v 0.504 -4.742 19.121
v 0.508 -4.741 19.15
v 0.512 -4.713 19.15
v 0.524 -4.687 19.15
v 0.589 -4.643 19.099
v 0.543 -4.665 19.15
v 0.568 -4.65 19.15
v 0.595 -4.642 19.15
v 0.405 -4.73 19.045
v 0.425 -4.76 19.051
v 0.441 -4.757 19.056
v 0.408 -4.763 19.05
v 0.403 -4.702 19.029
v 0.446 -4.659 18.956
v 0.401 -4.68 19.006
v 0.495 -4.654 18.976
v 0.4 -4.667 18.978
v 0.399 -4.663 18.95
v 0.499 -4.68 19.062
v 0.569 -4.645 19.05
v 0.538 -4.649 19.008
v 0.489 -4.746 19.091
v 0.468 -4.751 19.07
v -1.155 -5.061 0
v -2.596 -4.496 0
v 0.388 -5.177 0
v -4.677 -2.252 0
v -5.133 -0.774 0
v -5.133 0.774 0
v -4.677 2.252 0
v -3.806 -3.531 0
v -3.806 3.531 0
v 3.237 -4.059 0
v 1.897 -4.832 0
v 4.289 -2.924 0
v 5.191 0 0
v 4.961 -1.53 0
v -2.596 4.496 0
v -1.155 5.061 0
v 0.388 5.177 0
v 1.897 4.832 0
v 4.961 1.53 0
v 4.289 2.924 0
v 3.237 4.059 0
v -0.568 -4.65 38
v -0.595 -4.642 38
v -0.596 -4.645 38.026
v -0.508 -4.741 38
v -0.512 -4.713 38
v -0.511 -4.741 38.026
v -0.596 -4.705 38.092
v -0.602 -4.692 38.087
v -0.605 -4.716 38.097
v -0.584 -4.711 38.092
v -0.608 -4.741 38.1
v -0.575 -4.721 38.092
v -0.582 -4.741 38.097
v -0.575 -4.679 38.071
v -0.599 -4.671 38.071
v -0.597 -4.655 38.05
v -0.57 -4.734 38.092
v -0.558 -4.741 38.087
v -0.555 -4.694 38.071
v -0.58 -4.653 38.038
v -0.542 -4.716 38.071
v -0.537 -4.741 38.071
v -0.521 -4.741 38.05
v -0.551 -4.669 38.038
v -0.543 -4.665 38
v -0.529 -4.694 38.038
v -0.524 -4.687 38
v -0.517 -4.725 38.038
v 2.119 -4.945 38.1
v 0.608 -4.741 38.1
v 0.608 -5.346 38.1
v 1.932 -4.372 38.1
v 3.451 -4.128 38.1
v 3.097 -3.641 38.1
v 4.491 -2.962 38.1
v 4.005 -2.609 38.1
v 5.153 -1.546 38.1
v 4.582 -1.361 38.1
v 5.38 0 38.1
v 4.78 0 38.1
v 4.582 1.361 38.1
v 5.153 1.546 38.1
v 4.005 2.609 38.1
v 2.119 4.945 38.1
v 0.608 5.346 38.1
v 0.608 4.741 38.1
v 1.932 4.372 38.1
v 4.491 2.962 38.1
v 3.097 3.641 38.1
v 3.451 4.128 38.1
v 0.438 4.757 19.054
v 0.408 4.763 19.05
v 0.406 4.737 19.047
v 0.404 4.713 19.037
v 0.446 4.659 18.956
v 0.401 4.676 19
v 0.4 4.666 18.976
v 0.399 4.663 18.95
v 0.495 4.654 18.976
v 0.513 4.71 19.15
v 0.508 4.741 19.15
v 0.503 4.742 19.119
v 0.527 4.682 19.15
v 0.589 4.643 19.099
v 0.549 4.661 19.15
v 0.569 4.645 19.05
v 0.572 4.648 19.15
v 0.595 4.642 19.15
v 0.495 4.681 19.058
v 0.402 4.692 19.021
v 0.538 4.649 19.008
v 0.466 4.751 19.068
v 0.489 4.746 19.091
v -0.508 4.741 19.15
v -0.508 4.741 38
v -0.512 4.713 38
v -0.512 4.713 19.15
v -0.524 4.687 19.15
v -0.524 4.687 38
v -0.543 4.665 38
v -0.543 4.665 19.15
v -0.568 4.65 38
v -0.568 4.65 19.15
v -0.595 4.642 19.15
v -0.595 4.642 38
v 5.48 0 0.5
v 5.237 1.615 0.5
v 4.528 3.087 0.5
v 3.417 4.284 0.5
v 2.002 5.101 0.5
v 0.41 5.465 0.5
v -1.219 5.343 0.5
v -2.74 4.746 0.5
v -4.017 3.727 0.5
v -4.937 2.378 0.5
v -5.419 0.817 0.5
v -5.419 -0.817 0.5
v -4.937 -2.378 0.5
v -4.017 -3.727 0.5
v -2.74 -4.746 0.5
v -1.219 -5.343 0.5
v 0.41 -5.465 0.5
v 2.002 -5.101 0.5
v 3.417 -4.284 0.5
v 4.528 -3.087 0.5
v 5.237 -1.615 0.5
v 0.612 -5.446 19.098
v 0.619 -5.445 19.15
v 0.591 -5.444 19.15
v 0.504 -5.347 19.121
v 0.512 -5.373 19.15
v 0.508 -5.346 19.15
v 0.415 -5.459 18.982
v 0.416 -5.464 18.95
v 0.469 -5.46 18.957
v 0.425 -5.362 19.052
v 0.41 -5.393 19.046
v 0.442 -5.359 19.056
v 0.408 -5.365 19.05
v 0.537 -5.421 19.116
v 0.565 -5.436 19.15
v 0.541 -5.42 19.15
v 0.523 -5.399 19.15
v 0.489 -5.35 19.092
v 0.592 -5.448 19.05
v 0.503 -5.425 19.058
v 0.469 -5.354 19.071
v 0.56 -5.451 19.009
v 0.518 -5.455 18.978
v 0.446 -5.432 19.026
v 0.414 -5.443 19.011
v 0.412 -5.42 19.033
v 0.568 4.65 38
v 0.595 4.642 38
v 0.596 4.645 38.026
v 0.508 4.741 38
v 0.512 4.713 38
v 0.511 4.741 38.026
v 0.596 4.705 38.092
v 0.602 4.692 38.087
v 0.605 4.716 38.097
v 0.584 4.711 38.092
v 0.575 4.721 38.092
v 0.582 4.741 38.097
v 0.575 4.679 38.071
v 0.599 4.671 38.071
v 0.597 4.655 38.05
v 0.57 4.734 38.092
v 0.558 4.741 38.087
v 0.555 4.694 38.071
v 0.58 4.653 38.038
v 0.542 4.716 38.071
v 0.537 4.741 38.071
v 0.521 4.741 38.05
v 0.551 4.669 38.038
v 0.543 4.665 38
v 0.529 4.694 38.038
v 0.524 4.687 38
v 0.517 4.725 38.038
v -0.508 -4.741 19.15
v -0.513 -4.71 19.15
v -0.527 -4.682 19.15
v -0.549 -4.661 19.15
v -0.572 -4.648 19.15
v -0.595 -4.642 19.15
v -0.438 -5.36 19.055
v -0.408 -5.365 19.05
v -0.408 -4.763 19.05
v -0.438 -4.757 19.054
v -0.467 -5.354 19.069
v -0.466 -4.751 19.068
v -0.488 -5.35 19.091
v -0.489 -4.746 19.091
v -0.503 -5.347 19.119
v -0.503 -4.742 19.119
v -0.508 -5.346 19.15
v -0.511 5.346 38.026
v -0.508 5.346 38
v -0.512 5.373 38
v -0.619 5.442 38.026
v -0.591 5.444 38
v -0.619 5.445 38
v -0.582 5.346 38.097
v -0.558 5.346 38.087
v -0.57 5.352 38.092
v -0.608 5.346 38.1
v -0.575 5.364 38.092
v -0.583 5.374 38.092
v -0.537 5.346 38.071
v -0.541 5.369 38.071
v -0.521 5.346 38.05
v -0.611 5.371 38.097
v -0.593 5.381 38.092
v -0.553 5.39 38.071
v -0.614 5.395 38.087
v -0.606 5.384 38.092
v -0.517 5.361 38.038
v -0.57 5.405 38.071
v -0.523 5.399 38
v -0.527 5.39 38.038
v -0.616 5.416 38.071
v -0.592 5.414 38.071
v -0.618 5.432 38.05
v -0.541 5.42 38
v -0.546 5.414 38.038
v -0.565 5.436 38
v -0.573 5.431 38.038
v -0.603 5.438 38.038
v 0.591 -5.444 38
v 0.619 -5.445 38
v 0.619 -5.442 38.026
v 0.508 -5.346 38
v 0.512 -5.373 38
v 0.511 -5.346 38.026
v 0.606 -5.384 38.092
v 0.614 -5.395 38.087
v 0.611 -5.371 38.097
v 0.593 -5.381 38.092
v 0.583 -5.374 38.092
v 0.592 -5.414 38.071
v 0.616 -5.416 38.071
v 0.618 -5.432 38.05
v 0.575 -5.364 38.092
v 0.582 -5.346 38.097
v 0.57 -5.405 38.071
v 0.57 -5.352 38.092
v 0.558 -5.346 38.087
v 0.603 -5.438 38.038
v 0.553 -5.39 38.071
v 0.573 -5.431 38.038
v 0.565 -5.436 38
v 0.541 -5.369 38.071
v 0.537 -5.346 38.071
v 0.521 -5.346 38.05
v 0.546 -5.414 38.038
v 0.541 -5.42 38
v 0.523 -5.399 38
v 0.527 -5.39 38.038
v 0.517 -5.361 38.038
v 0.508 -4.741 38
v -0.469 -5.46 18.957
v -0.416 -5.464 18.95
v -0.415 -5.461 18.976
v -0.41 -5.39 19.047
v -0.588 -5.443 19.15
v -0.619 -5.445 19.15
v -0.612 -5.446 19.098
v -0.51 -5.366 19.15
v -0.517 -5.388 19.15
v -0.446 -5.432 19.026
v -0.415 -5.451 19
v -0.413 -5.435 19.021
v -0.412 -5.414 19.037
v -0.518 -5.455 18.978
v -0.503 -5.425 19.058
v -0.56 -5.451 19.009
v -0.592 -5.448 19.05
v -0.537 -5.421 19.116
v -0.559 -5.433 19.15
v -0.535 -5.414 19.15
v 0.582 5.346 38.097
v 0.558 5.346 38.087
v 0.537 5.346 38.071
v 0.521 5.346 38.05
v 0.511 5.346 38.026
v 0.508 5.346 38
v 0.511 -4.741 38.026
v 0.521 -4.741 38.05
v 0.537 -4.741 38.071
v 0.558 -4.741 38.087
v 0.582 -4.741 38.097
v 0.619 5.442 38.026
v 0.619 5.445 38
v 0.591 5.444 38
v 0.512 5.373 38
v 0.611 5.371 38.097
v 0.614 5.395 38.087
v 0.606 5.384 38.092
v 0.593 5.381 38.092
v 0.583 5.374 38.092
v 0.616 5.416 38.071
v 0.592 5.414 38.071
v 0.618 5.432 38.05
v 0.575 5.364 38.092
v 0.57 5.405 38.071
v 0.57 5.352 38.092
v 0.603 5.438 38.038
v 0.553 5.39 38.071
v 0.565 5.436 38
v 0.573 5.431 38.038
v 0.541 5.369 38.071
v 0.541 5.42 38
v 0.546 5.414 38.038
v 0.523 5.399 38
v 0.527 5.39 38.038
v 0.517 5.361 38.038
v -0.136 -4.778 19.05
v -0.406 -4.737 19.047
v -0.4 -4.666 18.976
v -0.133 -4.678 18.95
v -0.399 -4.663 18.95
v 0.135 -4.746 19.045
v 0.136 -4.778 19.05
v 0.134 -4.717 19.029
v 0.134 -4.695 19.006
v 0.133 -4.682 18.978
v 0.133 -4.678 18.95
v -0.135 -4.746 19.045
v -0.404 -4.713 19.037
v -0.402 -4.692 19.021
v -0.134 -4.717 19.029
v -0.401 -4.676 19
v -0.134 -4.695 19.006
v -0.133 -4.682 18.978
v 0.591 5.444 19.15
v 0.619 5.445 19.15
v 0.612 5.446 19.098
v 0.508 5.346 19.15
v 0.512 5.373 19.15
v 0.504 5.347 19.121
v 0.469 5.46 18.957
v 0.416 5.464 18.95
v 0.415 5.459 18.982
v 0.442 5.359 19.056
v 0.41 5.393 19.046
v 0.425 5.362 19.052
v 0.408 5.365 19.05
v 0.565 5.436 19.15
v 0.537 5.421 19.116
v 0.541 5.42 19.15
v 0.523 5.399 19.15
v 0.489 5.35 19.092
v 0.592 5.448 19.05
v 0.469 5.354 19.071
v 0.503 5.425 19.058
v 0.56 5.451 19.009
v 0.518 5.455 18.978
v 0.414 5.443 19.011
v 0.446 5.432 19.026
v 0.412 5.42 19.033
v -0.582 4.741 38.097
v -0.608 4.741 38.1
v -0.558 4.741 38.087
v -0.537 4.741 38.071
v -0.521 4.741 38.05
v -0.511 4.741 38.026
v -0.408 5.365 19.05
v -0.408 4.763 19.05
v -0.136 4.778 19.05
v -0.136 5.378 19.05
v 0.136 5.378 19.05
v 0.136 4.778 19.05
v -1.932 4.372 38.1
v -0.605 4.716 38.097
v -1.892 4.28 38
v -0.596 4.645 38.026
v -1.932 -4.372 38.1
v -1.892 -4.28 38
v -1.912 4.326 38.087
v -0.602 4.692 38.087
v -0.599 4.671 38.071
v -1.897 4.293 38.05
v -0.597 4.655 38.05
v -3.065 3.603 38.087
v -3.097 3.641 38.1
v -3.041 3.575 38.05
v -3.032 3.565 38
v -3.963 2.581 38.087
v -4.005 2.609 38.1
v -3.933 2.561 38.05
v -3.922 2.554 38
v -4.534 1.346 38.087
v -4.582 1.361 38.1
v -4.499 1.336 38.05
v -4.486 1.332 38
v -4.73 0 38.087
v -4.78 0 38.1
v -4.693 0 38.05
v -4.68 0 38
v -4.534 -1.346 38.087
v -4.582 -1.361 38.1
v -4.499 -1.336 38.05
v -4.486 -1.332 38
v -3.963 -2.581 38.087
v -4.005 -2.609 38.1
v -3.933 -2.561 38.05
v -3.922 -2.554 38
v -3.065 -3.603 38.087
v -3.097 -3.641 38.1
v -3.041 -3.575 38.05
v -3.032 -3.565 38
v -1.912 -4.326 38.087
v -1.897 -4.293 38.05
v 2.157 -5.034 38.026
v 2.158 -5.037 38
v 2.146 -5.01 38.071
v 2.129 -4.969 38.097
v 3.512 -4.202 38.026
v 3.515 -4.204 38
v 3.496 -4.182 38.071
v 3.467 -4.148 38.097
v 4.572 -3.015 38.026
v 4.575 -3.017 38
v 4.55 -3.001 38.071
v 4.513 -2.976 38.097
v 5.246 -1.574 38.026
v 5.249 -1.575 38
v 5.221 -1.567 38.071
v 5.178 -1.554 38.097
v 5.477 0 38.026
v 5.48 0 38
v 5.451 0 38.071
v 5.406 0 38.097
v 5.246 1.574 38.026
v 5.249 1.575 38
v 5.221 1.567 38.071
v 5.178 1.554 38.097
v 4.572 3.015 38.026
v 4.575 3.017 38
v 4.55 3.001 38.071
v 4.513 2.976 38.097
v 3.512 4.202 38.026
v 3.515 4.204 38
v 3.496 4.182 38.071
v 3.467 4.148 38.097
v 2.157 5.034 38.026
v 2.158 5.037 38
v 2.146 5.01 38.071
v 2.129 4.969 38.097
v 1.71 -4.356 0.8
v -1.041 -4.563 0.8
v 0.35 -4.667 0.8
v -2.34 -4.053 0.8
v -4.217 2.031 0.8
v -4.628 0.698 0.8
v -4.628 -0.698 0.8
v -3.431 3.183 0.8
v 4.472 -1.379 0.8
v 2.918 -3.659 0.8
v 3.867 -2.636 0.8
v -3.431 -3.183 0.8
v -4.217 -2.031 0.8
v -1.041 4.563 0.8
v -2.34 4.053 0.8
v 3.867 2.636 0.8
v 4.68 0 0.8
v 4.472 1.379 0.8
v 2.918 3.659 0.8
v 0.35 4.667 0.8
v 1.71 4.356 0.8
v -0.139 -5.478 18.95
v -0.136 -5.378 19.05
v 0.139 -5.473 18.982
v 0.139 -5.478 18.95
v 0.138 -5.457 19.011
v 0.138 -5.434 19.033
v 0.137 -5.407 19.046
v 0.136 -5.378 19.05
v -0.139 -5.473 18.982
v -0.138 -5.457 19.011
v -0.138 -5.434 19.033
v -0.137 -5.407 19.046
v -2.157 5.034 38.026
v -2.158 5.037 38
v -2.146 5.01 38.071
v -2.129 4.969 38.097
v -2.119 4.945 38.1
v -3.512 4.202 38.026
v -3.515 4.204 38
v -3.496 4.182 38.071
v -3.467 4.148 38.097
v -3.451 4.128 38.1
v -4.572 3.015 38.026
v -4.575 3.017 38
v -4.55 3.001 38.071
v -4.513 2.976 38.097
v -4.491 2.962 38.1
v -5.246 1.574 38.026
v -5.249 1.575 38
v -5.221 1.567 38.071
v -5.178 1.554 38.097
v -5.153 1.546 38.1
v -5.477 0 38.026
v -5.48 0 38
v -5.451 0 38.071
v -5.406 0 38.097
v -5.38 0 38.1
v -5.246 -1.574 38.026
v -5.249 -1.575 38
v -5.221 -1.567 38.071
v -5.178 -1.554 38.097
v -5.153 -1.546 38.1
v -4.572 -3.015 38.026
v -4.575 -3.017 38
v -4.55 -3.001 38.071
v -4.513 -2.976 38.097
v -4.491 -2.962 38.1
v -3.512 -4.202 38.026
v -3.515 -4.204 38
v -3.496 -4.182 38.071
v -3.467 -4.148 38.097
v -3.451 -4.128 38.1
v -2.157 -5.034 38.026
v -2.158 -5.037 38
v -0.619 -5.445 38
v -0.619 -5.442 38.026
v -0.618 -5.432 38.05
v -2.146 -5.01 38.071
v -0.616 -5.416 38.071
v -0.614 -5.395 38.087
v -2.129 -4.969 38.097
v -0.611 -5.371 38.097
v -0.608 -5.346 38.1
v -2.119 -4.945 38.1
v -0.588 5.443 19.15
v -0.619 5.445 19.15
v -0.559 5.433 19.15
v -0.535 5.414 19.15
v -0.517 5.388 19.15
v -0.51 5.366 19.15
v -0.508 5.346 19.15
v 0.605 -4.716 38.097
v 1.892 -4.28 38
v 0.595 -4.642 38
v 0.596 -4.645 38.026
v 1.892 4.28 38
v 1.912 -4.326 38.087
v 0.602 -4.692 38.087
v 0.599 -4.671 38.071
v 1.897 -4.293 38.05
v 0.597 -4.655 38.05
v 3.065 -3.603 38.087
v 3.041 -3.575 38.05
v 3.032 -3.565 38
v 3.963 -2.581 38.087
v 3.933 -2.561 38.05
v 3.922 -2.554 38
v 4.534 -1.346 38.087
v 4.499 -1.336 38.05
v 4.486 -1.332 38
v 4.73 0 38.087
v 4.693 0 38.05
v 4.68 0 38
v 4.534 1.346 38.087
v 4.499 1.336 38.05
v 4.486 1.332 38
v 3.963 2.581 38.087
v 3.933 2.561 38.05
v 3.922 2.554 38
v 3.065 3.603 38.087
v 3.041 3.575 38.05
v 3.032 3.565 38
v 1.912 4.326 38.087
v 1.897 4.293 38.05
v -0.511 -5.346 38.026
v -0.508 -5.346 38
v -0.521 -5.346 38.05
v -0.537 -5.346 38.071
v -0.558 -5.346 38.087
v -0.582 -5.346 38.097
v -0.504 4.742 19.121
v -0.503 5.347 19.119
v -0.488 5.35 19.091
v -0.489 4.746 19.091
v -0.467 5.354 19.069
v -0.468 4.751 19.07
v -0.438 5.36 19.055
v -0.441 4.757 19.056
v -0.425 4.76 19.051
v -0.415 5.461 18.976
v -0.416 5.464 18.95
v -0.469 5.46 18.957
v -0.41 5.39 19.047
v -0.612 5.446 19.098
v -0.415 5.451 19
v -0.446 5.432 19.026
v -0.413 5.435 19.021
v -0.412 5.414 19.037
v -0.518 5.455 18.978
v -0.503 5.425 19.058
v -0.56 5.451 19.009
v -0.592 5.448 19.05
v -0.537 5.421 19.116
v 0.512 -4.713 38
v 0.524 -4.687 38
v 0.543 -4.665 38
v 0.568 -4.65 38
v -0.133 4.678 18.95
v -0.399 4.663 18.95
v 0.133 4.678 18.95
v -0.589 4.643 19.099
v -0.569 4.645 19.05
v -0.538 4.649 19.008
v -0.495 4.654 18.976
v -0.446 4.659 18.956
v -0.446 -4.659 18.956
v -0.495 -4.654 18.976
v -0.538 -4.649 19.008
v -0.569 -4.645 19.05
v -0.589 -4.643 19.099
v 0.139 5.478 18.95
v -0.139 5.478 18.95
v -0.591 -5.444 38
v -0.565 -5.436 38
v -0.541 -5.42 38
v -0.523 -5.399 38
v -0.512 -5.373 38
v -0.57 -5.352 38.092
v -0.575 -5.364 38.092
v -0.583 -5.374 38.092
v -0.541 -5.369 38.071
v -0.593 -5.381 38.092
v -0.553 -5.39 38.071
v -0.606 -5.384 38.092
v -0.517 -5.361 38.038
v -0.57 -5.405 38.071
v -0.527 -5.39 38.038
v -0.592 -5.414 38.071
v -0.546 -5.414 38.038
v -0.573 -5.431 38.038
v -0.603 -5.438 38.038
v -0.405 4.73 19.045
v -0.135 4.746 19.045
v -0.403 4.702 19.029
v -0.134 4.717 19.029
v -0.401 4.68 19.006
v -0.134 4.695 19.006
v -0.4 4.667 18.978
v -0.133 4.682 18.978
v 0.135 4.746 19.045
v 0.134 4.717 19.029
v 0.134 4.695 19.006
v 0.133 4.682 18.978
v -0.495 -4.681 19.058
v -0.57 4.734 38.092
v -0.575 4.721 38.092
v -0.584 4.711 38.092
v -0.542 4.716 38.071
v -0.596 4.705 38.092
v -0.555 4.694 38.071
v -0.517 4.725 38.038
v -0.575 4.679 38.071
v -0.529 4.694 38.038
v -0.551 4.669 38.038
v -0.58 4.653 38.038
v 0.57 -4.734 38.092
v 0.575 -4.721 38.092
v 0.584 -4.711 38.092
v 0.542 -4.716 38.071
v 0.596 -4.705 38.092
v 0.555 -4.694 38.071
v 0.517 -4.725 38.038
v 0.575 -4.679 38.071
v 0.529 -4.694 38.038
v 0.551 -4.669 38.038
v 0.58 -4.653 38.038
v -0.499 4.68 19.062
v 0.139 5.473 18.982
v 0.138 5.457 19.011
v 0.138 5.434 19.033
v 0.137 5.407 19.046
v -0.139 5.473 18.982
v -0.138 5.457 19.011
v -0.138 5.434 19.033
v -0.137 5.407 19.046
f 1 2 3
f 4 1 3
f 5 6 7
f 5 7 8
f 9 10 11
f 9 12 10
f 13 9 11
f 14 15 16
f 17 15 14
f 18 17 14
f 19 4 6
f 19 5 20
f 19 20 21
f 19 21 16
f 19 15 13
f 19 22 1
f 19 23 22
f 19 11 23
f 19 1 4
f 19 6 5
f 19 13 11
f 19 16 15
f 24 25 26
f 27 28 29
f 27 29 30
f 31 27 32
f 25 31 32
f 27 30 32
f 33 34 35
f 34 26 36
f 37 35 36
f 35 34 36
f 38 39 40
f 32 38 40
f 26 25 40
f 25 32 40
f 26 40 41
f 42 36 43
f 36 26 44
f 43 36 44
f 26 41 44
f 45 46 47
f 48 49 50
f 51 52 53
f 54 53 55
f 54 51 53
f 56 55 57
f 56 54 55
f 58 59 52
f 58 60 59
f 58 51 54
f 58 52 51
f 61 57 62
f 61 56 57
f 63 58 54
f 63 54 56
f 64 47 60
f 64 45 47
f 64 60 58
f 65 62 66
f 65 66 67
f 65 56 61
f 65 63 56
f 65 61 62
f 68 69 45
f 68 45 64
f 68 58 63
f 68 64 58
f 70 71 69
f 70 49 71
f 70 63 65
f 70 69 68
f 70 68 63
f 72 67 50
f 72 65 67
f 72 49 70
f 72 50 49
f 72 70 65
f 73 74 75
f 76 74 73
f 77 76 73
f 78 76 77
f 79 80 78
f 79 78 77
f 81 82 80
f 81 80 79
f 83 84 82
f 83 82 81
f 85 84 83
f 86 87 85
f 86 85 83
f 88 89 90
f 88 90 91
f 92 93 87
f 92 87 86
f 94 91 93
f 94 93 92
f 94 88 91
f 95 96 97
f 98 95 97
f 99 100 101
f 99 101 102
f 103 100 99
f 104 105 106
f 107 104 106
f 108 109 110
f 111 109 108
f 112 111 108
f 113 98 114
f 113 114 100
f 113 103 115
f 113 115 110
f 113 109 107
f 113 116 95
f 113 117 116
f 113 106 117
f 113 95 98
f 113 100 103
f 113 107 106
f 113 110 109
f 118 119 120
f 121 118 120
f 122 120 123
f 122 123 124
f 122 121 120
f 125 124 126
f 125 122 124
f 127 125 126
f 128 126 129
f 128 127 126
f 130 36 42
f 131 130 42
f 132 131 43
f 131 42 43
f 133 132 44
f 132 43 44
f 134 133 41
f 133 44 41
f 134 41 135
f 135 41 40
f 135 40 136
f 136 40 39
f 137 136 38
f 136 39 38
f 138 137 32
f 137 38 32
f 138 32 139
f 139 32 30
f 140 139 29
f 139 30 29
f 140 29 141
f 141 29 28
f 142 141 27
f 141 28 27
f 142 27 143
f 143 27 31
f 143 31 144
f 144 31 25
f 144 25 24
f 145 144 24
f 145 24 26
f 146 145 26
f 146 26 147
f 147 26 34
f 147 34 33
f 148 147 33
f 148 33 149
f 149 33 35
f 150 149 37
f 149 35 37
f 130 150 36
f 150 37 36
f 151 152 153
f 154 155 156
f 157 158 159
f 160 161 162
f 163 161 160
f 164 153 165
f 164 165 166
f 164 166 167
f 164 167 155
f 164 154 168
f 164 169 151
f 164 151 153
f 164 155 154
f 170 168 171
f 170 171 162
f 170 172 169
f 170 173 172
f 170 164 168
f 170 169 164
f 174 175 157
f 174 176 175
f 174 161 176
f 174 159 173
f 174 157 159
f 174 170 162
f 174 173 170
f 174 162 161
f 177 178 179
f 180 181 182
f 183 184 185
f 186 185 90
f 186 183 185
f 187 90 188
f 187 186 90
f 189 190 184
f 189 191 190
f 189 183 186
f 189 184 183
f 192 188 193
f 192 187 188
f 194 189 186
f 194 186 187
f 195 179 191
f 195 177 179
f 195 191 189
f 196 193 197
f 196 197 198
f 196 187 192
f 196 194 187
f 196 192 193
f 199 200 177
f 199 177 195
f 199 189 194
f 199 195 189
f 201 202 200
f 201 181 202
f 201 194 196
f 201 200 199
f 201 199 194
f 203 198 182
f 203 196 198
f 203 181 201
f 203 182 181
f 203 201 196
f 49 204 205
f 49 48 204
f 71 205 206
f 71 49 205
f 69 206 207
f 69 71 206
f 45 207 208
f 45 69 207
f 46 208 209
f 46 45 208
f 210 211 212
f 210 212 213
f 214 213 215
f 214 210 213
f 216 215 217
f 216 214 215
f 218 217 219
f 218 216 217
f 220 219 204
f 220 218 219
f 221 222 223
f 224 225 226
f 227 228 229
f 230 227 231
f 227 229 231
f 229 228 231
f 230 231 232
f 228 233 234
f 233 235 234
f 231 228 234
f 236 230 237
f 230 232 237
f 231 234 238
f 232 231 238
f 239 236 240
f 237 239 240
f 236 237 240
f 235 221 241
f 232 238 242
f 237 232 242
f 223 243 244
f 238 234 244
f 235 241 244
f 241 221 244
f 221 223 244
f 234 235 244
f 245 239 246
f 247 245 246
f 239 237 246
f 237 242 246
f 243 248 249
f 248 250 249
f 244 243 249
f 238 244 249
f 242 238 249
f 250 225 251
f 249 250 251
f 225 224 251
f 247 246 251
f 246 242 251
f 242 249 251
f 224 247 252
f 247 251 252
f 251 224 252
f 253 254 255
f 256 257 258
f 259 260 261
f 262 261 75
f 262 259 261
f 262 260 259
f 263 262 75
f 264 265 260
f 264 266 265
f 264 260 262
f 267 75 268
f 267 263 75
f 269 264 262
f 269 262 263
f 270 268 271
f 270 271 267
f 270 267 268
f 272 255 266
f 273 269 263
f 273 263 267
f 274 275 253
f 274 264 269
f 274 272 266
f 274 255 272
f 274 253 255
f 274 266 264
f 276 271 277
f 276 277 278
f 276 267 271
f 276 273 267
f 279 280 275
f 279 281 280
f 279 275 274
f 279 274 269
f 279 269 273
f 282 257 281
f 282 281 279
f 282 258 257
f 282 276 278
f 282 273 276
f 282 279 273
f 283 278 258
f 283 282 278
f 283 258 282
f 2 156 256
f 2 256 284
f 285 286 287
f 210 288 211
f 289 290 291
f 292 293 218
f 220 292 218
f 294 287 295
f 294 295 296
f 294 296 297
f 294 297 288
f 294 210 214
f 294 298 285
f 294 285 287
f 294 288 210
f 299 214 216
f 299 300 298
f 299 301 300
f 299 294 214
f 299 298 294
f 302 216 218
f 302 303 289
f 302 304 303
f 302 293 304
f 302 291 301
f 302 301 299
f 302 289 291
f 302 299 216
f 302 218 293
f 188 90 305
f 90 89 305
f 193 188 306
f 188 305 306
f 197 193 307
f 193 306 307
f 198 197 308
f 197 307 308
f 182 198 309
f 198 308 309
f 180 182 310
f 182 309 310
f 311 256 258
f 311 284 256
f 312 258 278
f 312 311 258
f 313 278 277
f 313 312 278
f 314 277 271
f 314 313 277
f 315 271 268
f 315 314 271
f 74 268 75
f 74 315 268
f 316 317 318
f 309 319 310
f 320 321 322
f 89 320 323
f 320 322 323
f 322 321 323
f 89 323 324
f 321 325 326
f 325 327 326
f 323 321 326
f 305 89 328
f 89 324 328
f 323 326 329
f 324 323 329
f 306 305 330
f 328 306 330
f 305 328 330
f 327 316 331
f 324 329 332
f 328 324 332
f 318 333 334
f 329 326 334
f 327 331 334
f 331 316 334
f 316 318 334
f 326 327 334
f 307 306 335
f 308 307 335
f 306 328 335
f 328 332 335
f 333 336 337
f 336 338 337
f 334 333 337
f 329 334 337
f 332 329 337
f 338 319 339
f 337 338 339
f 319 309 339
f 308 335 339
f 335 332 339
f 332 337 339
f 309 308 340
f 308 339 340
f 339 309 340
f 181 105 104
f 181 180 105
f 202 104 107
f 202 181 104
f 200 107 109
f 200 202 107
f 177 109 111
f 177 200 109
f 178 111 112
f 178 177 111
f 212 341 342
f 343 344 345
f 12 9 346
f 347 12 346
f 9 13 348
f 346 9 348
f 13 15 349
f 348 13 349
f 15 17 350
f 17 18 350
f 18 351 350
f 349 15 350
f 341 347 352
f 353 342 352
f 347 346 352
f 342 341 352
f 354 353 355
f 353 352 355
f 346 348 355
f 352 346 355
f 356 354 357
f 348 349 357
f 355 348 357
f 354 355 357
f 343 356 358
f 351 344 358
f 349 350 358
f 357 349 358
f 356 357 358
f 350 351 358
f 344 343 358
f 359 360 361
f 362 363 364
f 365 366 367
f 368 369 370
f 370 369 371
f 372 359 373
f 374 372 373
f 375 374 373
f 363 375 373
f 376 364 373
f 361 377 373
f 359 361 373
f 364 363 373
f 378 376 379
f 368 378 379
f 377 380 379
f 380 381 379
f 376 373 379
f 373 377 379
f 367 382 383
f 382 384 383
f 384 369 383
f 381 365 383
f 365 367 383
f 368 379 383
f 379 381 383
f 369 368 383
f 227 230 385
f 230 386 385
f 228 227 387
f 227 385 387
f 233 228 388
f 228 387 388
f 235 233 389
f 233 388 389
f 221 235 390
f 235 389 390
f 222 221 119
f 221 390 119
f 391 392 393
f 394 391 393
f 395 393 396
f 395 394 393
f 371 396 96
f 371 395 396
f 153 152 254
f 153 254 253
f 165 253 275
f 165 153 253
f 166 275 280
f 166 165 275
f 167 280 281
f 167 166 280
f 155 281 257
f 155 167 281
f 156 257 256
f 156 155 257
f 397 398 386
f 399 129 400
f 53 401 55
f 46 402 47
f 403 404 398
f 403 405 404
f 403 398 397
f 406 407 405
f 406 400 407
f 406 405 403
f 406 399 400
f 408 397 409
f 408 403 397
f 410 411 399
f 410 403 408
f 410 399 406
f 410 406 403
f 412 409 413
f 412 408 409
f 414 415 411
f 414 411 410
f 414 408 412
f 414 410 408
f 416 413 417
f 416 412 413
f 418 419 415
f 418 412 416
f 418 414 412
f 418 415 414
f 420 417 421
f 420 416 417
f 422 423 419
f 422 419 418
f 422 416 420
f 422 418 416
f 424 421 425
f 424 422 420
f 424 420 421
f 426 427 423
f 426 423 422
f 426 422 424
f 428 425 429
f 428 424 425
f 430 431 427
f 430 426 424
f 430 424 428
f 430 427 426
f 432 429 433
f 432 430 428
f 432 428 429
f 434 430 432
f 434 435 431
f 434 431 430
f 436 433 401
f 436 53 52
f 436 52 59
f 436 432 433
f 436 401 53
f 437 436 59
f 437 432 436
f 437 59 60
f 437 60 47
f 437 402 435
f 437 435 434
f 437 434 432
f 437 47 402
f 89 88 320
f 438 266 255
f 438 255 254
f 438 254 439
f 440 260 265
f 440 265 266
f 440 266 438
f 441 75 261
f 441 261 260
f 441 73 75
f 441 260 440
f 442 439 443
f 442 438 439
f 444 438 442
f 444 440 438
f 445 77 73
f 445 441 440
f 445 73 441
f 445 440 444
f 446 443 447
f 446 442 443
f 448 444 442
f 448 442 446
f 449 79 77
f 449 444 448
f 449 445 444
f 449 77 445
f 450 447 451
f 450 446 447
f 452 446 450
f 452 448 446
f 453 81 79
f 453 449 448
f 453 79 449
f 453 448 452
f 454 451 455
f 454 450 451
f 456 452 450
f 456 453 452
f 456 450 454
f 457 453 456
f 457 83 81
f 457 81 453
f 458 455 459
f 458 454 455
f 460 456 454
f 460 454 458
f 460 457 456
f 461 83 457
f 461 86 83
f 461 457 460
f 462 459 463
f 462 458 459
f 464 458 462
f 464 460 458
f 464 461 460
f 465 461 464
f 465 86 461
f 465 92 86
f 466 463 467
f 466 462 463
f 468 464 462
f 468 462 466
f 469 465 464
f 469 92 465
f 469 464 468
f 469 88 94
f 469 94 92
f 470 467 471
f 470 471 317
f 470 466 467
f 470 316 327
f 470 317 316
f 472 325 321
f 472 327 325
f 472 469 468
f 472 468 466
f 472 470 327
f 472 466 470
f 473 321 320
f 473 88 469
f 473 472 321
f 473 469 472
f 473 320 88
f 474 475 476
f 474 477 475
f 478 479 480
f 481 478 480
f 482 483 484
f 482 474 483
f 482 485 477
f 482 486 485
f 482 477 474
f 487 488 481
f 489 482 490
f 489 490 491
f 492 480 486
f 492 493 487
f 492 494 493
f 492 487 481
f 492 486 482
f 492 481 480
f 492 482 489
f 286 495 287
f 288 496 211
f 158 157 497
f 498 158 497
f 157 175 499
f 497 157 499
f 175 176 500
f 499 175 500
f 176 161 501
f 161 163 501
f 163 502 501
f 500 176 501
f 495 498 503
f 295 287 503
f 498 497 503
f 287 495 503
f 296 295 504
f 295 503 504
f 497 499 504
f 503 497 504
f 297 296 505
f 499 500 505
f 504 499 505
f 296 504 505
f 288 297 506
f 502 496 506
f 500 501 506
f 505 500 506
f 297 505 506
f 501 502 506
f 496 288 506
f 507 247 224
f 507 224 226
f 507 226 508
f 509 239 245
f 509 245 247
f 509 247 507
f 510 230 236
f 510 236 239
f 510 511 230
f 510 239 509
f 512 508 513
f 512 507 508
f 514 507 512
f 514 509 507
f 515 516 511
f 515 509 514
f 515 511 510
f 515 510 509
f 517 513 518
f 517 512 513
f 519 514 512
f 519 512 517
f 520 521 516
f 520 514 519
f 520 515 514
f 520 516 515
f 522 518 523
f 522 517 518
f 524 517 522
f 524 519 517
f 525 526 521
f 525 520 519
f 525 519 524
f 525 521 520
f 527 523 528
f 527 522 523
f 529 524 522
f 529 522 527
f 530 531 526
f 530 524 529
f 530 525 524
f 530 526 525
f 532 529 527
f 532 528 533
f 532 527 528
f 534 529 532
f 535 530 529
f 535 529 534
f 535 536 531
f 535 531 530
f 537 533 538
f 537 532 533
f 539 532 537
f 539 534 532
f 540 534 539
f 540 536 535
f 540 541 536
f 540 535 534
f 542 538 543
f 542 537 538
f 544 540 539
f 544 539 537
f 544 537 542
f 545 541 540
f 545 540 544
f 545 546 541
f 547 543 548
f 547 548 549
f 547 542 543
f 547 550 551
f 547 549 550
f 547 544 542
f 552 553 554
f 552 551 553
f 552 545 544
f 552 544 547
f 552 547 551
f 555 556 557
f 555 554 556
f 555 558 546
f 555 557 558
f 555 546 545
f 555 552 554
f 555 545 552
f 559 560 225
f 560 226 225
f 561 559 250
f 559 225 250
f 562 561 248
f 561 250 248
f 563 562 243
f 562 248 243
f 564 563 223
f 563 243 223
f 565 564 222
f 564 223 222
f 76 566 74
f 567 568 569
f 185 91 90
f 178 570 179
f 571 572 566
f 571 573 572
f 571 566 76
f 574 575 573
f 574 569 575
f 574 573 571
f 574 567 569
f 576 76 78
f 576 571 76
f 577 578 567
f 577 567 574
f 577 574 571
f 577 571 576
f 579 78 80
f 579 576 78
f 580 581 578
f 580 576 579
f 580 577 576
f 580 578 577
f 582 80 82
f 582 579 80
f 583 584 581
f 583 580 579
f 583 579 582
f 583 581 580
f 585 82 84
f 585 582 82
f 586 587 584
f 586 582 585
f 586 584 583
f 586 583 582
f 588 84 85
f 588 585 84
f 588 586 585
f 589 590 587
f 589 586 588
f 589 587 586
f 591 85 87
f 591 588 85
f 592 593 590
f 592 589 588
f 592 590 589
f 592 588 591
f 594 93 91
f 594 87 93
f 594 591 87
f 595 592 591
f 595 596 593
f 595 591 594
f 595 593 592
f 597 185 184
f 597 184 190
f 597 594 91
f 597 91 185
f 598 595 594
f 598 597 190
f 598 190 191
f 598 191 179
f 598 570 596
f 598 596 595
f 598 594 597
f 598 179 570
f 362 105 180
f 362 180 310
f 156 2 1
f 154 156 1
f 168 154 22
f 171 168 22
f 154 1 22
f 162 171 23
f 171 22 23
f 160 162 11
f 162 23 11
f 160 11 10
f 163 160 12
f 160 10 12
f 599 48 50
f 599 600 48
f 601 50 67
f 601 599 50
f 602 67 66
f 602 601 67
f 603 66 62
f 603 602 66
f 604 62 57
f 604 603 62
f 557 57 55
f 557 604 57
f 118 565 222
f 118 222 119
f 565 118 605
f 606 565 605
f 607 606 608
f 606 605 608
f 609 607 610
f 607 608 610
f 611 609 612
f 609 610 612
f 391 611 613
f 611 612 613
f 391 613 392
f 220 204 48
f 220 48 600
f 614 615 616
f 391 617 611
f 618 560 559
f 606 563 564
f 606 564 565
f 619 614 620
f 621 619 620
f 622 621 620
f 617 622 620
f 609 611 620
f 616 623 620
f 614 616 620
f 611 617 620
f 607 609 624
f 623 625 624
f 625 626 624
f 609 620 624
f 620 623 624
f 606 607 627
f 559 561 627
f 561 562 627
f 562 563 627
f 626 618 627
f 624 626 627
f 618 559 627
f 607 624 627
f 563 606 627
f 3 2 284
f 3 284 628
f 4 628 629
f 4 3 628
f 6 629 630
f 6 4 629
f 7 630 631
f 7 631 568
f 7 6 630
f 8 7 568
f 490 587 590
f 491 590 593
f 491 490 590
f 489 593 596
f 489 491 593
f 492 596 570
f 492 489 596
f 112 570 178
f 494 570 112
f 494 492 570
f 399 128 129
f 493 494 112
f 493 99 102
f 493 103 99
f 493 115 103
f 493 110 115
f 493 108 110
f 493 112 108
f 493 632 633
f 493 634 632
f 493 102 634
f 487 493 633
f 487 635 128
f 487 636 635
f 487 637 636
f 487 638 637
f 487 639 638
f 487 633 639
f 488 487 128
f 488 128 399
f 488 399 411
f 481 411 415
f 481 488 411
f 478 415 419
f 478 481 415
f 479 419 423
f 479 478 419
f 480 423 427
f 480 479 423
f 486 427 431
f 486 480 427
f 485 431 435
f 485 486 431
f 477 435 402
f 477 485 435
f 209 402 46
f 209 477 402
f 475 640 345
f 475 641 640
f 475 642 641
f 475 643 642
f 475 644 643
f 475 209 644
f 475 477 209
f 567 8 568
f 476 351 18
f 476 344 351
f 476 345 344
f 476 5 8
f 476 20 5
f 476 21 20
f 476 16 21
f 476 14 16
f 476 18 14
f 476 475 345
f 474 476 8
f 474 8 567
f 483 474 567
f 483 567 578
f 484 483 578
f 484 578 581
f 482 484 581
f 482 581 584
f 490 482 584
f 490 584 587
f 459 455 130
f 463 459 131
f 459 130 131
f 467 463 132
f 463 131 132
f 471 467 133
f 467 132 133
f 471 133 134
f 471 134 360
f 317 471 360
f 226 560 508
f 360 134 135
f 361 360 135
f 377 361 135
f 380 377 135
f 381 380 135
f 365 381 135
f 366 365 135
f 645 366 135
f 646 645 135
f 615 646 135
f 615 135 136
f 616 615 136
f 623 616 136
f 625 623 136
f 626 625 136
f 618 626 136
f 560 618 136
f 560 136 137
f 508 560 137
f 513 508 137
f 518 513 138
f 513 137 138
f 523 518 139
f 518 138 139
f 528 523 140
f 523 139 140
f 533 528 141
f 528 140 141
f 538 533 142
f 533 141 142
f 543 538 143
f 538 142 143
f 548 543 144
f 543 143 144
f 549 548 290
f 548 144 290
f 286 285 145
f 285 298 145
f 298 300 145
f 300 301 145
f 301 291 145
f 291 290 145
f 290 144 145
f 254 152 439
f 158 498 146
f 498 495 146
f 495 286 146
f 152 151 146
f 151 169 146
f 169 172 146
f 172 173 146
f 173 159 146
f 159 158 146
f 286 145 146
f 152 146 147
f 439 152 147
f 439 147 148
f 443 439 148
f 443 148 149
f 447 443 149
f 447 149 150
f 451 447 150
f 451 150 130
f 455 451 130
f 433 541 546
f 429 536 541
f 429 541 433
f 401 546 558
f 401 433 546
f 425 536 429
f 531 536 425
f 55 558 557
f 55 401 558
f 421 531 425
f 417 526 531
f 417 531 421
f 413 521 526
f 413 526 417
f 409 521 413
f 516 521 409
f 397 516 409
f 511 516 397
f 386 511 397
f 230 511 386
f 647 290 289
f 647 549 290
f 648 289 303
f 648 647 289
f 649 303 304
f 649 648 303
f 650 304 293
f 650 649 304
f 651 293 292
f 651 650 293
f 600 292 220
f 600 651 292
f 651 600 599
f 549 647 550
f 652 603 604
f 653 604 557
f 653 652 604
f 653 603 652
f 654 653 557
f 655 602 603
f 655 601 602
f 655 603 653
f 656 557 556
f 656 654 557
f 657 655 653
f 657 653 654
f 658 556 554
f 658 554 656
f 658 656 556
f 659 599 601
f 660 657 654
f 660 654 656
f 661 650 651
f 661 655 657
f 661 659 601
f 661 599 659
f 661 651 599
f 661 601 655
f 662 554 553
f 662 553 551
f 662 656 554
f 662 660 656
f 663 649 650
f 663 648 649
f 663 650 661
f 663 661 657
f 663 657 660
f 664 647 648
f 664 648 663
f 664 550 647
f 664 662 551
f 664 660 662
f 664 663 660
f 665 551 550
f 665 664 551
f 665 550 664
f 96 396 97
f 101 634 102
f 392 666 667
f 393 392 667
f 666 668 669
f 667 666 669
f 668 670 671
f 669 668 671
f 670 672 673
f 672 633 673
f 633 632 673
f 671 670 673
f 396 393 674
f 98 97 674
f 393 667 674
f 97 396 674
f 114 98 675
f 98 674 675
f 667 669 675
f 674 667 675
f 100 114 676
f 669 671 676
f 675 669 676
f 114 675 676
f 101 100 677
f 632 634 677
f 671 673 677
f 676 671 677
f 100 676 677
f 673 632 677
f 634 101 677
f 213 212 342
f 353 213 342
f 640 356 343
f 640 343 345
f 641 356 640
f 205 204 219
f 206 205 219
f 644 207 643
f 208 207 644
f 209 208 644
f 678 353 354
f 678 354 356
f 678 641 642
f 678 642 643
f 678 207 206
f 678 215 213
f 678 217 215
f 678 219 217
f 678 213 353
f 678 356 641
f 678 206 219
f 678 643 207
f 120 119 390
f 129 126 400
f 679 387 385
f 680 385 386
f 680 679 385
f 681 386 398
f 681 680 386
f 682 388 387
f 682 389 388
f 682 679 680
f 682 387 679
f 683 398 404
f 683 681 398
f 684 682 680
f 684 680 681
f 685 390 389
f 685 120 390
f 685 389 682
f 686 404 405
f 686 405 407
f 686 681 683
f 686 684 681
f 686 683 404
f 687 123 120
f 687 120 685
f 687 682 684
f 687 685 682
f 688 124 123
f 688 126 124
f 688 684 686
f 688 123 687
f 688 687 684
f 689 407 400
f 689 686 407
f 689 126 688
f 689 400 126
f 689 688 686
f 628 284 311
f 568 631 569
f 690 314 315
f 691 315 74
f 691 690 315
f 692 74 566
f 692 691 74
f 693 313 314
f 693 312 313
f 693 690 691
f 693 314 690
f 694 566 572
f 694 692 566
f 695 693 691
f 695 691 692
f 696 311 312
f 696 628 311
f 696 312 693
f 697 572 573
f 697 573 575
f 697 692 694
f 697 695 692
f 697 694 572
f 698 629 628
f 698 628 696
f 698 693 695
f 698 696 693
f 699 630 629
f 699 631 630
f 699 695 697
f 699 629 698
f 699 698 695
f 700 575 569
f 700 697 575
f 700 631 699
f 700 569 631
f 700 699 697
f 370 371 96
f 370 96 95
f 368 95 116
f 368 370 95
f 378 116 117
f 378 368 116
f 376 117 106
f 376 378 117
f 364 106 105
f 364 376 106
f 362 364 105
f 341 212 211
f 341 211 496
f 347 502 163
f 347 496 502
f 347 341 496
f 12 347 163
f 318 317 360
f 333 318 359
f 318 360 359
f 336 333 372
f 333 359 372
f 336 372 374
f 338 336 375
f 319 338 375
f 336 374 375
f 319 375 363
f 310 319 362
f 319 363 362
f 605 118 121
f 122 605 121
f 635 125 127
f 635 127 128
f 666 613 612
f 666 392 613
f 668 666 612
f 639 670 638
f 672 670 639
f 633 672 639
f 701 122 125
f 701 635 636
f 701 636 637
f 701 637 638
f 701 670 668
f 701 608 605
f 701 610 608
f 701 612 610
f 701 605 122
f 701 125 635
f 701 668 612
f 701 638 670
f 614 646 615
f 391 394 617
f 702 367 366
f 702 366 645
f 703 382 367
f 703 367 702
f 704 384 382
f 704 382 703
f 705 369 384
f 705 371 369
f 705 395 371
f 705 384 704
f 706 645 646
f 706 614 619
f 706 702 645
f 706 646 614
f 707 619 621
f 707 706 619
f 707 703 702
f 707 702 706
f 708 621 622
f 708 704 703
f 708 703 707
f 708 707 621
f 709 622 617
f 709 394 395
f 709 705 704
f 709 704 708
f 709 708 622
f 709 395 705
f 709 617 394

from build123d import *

# Parameters (mm, degrees)
F0_R     = 5.48
F1_DEPTH = 38.1
F2_T     = -0.8
F4_DEPTH = 19.05
F5_F1_R  = 0.100000054
F5_F2_R  = 0.100000054
F6_SIZE2 = 0.2886751346
F6_SIZE  = 0.5


with BuildPart() as f1:
    # F0 (on Top) → F1 (new body)
    with BuildSketch(Plane.XY):
        Circle(F0_R)
    extrude(amount=F1_DEPTH)

    # F2
    f2_openings = [f1.faces().sort_by_distance(p)[0] for p in [
        (0, 0, 38.1),
    ]]
    offset(amount=F2_T, openings=f2_openings)

    # F3 (on face) → F4 (cut)
    with BuildSketch(Plane.XY.offset(38.1)):
        with BuildLine():
            Line((0.508, 4.6523473645), (0.508, 5.4564032109))
            ThreePointArc((0.508, 5.4564032109), (0, 5.48), (-0.508, 5.4564032109))
            Line((-0.508, 5.4564032109), (-0.508, 4.6523473645))
            ThreePointArc((-0.508, 4.6523473645), (0, 4.68), (0.508, 4.6523473645))
        make_face()
        with BuildLine():
            Line((0.508, -5.4564032109), (0.508, -4.6523473645))
            ThreePointArc((0.508, -4.6523473645), (0, -4.68), (-0.508, -4.6523473645))
            Line((-0.508, -4.6523473645), (-0.508, -5.4564032109))
            ThreePointArc((-0.508, -5.4564032109), (0, -5.48), (0.508, -5.4564032109))
        make_face()
    extrude(amount=-F4_DEPTH, mode=Mode.SUBTRACT)

    # F5: fillet of radius 0.100000054 on 20 edges, made by hand

    # F5_f1
    f5_f1_edges = [f1.edges().sort_by_distance(p)[0] for p in [
        (0.508, -5.0543752877, 19.05),
        (-0.508, -5.0543752877, 19.05),
        (-0.508, 5.0543752877, 19.05),
        (0.508, 5.0543752877, 19.05),
    ]]
    fillet(f5_f1_edges, radius=F5_F1_R)

    # F5_f2
    f5_f2_edges = [f1.edges().sort_by_distance(p)[0] for p in [
        (-0.508, 5.0543752877, 38.1),
        (-4.68, 0, 38.1),
        (-0.508, -5.0543752877, 38.1),
        (-5.48, 0, 38.1),
        (4.0505703302, -3.6909727715, 38.1),
        (0.508, -5.0543752877, 38.1),
        (3.4842387978, -3.1244967595, 38.1),
        (3.4842387978, 3.1244967595, 38.1),
        (0.508, 5.0543752877, 38.1),
        (4.0505703302, 3.6909727715, 38.1),
        (0.508, -5.4564032109, 28.625000027),
        (0.508, -4.6523473645, 28.625000027),
        (-0.508, -4.6523473645, 28.625000027),
        (-0.508, -5.4564032109, 28.625000027),
        (0, 4.68, 19.05),
        (0, 5.48, 19.05),
        (0.4787933813, 5.4590435891, 19.0793721529),
        (-0.4787933846, 5.4590435887, 19.0793721564),
        (-0.4787918965, 4.6554439453, 19.0793706648),
        (0.4787918943, 4.6554439457, 19.0793706623),
        (-0.4787933813, -5.4590435891, 19.0793721529),
        (-0.4787918943, -4.6554439457, 19.0793706623),
        (0.4787918943, -4.6554439457, 19.0793706623),
        (0.4787933813, -5.4590435891, 19.0793721529),
    ]]
    fillet(f5_f2_edges, radius=F5_F2_R)

    # F6
    f6_edges = [f1.edges().sort_by_distance(p)[0] for p in [
        (-5.48, 0, 0),
    ]]
    f6_side = f1.faces().sort_by_distance((-5.48, 0, 19))[0]
    chamfer(f6_edges, length=F6_SIZE, length2=F6_SIZE2, reference=f6_side)


solid = f1.part
